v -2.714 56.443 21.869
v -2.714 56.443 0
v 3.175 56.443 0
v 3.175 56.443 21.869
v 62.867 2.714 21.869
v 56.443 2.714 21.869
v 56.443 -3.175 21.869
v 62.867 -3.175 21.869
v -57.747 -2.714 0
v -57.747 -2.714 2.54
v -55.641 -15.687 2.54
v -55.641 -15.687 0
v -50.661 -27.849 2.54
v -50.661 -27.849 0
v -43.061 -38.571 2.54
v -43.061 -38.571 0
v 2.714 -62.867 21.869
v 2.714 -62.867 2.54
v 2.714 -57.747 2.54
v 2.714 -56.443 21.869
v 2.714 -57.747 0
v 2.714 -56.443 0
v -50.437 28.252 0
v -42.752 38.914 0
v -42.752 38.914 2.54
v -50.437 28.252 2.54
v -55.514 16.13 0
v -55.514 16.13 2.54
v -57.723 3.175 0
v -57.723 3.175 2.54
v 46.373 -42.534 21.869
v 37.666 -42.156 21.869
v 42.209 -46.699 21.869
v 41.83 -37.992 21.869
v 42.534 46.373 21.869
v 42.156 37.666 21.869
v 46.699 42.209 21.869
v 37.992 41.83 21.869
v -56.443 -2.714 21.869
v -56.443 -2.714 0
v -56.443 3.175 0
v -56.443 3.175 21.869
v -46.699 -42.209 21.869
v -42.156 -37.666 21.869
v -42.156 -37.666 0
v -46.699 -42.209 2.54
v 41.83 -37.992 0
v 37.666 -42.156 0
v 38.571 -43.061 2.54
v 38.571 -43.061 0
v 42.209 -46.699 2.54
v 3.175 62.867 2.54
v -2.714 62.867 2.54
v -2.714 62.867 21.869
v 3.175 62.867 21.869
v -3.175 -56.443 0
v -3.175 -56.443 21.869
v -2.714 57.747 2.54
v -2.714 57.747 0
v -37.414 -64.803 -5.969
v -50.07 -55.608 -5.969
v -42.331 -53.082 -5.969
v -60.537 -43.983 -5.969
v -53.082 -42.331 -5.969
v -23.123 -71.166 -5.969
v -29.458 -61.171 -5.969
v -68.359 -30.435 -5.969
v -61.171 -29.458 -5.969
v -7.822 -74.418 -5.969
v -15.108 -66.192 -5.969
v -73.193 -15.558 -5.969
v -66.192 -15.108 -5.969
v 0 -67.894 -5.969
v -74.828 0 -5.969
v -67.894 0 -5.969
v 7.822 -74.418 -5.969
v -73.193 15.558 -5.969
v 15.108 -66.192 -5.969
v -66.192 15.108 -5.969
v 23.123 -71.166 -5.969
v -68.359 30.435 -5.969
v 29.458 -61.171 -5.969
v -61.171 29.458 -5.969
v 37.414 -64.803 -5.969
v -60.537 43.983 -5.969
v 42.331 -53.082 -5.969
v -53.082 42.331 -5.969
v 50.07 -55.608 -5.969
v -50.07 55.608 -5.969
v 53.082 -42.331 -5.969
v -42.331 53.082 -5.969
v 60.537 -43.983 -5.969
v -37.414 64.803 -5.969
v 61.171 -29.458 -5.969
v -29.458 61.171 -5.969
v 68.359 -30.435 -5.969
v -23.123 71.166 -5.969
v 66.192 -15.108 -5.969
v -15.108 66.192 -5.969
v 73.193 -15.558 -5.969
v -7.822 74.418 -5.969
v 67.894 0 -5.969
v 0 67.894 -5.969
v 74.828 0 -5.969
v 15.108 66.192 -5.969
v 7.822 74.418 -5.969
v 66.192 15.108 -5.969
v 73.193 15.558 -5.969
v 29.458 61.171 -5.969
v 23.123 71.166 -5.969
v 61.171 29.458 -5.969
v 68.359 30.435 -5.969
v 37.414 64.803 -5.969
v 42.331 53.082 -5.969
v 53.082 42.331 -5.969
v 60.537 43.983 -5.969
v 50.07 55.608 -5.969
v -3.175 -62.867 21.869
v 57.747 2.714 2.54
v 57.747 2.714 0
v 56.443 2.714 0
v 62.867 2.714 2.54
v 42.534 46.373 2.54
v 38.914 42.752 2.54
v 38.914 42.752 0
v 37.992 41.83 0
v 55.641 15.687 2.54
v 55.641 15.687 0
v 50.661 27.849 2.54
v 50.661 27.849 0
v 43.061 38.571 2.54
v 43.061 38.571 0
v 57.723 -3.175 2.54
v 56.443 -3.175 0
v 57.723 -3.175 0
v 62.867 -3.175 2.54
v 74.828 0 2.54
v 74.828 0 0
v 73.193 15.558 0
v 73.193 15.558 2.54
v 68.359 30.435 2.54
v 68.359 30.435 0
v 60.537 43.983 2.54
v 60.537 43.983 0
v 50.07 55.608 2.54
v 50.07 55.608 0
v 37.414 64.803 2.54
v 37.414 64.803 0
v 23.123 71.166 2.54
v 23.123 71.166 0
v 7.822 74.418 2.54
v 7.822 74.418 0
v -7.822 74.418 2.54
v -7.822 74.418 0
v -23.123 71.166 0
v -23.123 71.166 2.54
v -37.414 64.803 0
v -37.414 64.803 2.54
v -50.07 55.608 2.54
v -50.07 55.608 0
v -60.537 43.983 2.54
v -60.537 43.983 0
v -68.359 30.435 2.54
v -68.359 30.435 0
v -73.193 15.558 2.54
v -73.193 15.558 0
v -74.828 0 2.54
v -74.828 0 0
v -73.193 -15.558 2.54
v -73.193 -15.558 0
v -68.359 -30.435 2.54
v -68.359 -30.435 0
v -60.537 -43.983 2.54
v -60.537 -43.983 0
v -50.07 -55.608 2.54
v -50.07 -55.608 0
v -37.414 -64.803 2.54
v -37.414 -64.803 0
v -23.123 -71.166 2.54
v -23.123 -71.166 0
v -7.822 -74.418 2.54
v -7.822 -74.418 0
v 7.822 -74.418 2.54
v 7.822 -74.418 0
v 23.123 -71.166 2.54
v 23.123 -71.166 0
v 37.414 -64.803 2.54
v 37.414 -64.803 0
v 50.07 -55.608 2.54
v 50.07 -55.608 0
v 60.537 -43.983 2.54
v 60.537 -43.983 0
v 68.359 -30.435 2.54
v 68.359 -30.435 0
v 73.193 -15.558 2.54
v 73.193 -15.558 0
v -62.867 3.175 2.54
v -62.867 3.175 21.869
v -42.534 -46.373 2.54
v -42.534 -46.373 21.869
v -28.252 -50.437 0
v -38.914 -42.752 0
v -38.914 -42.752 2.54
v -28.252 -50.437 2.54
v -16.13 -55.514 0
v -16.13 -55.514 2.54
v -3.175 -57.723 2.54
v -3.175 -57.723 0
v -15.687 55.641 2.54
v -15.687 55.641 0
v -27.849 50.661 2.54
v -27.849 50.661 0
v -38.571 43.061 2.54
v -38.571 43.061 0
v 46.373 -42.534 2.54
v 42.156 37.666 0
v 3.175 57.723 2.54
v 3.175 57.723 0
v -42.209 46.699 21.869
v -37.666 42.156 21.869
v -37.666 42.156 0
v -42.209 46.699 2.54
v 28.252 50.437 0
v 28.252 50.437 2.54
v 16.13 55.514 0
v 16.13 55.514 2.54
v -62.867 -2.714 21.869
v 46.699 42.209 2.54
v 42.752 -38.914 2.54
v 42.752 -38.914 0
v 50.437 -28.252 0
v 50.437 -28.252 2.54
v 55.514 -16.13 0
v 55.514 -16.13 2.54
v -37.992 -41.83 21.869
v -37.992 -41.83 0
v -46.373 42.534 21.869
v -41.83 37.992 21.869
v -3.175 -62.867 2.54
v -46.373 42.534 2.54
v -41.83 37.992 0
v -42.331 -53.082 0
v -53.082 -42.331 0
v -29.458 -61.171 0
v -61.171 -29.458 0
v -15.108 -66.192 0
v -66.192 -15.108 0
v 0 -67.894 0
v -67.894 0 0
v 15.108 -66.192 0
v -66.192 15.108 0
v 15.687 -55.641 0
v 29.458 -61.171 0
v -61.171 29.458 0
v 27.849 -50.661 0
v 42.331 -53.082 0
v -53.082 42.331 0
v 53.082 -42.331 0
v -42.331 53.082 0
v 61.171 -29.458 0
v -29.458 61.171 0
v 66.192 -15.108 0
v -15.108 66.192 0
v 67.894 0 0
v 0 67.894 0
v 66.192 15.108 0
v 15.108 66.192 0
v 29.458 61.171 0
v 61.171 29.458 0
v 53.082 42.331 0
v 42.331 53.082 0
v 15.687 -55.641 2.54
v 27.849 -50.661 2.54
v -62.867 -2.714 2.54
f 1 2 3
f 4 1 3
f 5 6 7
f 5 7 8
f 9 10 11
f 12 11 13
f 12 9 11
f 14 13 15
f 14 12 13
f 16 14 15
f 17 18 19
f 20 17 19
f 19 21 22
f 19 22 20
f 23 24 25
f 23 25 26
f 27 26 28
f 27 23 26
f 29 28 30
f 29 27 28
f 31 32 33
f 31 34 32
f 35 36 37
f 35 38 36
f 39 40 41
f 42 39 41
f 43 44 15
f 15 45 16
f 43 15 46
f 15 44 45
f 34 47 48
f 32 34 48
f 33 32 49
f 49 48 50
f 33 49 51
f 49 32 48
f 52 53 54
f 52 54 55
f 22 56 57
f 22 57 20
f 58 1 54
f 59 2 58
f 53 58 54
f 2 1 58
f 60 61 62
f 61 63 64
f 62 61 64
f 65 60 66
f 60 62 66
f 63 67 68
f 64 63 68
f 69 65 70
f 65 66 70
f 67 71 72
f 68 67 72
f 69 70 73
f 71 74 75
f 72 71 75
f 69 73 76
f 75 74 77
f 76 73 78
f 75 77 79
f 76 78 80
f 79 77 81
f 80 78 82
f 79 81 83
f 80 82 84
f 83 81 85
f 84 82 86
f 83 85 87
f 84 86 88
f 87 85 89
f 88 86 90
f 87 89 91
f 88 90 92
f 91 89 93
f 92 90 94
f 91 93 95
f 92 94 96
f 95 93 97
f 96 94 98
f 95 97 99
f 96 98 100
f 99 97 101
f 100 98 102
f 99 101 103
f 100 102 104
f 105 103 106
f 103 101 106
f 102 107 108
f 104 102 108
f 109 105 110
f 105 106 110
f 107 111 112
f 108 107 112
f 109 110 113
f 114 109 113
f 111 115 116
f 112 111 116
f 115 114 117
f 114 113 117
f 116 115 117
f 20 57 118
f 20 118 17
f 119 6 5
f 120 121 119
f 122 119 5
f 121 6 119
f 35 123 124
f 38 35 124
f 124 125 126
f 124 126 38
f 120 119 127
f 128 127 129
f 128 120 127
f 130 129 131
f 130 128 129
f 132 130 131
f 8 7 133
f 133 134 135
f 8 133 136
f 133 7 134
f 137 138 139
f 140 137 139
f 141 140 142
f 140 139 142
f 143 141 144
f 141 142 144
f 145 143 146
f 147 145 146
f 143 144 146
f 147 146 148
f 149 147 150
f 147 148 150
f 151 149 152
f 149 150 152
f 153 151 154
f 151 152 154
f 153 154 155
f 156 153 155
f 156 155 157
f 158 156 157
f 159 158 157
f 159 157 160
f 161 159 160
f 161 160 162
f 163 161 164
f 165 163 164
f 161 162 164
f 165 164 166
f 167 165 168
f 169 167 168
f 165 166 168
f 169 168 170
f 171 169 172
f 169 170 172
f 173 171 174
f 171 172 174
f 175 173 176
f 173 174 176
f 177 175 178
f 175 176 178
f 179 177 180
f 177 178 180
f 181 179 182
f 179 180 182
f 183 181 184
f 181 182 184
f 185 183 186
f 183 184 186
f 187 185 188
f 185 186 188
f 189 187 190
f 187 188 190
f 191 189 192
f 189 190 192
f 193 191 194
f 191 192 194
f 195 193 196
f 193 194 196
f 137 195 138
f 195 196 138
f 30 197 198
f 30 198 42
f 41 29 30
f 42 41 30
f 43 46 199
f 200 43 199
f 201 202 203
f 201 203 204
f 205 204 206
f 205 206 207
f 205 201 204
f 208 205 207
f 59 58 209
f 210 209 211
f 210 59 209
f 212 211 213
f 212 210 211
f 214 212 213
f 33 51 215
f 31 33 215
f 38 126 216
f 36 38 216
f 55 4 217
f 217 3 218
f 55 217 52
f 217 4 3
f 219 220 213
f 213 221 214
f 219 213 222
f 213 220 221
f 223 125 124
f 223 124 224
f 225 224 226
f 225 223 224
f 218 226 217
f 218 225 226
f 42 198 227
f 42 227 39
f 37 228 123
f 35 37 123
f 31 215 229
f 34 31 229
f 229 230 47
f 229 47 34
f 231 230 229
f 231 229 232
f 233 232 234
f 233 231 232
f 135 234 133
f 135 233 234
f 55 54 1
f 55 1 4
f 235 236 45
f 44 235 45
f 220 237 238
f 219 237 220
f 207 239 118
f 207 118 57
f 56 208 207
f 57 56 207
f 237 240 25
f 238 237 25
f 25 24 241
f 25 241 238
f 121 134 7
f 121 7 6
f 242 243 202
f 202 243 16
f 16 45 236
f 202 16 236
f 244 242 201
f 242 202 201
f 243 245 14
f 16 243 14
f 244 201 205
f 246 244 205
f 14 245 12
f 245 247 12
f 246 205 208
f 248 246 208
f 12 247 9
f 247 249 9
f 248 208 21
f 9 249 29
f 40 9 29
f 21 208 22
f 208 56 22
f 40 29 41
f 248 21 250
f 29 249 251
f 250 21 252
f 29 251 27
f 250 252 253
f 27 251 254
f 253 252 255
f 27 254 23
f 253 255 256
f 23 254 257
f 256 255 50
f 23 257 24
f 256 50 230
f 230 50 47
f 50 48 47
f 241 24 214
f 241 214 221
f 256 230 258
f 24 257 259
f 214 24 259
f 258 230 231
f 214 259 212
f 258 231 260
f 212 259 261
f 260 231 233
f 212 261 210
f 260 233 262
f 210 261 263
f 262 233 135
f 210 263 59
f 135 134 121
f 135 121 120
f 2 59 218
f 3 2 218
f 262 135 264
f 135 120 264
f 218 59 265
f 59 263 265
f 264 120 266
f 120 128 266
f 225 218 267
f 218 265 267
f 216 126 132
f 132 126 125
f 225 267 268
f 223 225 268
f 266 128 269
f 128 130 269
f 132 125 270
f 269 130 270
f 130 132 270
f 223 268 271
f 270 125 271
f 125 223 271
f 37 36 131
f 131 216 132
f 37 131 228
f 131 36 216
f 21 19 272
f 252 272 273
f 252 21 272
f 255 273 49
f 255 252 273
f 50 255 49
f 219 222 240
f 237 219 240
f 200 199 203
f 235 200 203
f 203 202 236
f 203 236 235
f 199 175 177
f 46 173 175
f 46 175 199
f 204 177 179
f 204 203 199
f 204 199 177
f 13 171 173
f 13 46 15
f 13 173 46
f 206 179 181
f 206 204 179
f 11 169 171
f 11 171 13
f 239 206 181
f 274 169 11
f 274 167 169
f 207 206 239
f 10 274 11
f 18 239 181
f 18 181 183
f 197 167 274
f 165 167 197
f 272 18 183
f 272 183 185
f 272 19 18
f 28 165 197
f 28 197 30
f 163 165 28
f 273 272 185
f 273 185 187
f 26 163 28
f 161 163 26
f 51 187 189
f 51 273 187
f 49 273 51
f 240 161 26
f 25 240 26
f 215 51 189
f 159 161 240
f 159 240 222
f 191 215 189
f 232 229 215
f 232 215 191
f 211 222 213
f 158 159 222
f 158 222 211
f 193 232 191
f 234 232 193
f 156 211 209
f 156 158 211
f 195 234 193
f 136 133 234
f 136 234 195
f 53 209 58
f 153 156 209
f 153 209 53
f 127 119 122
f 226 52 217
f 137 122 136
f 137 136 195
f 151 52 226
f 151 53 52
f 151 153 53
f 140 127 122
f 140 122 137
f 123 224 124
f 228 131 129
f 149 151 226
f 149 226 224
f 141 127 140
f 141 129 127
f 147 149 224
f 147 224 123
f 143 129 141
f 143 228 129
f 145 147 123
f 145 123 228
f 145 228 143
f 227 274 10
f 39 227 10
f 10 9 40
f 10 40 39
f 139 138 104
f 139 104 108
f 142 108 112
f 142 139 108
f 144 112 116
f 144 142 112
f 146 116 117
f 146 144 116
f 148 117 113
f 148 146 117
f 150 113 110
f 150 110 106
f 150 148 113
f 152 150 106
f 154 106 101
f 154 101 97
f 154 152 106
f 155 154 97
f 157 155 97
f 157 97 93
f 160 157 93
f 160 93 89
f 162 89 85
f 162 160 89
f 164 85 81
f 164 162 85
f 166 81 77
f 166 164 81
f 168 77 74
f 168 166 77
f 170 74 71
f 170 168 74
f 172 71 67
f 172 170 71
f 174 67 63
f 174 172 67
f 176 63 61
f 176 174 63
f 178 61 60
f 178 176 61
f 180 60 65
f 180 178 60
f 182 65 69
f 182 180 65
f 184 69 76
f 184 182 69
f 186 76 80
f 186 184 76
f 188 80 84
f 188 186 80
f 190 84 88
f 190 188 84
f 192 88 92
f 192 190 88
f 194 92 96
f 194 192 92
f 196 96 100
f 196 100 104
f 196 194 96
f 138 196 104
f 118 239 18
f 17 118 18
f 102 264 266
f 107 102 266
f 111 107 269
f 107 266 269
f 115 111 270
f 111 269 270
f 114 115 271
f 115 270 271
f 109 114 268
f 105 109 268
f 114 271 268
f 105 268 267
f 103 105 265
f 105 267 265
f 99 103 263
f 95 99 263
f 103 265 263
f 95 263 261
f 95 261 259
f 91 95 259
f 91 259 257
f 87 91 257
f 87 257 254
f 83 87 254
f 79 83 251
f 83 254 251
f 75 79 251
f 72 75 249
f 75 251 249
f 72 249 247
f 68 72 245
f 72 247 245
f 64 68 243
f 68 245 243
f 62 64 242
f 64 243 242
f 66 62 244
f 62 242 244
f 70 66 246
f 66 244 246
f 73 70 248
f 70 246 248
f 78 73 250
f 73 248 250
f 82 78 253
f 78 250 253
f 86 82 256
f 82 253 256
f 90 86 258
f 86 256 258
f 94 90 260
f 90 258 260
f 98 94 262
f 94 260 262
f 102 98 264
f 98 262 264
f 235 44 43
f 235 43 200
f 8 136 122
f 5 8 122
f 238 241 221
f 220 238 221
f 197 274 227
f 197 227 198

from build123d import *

# Parameters (mm, degrees)
F0_R     = 74.8284
F0_R_2   = 67.8942
F1_DEPTH = 5.969
F2_R     = 74.8284
F2_R_2   = 57.8104
F3_DEPTH = 2.54
F4_W     = 6.424342
F4_H     = 5.888975
F4_W_2   = 5.888975
F4_H_2   = 6.424342
F5_DEPTH = 21.8694


with BuildPart() as f1:
    # F0 (on Top) → F1 (new body)
    with BuildSketch(Plane.XY):
        Circle(F0_R)
        Circle(F0_R_2, mode=Mode.SUBTRACT)
    extrude(amount=-F1_DEPTH)

    # F2 (on Top) → F3 (join)
    with BuildSketch(Plane.XY):
        Circle(F2_R)
        Circle(F2_R_2, mode=Mode.SUBTRACT)
    extrude(amount=F3_DEPTH)

    # F4 (on Top) → F5 (join)
    with BuildSketch(Plane.XY):
        with Locations((-59.654696, 0.23042)):
            Rectangle(F4_W, F4_H)
        Polygon((-42.155891, -37.665894), (-46.698586, -42.208589), (-42.534452, -46.372723), (-37.991757, -41.830028), align=None)
        with Locations((-0.23042, -59.654696)):
            Rectangle(F4_W_2, F4_H_2)
        Polygon((37.665894, -42.155891), (42.208589, -46.698586), (46.372723, -42.534452), (41.830028, -37.991757), align=None)
        with Locations((59.654696, -0.23042)):
            Rectangle(F4_W, F4_H)
        Polygon((42.155891, 37.665894), (46.698586, 42.208589), (42.534452, 46.372723), (37.991757, 41.830028), align=None)
        with Locations((0.23042, 59.654696)):
            Rectangle(F4_W_2, F4_H_2)
        Polygon((-37.665894, 42.155891), (-42.208589, 46.698586), (-46.372723, 42.534452), (-41.830028, 37.991757), align=None)
    extrude(amount=F5_DEPTH)


solid = f1.part
